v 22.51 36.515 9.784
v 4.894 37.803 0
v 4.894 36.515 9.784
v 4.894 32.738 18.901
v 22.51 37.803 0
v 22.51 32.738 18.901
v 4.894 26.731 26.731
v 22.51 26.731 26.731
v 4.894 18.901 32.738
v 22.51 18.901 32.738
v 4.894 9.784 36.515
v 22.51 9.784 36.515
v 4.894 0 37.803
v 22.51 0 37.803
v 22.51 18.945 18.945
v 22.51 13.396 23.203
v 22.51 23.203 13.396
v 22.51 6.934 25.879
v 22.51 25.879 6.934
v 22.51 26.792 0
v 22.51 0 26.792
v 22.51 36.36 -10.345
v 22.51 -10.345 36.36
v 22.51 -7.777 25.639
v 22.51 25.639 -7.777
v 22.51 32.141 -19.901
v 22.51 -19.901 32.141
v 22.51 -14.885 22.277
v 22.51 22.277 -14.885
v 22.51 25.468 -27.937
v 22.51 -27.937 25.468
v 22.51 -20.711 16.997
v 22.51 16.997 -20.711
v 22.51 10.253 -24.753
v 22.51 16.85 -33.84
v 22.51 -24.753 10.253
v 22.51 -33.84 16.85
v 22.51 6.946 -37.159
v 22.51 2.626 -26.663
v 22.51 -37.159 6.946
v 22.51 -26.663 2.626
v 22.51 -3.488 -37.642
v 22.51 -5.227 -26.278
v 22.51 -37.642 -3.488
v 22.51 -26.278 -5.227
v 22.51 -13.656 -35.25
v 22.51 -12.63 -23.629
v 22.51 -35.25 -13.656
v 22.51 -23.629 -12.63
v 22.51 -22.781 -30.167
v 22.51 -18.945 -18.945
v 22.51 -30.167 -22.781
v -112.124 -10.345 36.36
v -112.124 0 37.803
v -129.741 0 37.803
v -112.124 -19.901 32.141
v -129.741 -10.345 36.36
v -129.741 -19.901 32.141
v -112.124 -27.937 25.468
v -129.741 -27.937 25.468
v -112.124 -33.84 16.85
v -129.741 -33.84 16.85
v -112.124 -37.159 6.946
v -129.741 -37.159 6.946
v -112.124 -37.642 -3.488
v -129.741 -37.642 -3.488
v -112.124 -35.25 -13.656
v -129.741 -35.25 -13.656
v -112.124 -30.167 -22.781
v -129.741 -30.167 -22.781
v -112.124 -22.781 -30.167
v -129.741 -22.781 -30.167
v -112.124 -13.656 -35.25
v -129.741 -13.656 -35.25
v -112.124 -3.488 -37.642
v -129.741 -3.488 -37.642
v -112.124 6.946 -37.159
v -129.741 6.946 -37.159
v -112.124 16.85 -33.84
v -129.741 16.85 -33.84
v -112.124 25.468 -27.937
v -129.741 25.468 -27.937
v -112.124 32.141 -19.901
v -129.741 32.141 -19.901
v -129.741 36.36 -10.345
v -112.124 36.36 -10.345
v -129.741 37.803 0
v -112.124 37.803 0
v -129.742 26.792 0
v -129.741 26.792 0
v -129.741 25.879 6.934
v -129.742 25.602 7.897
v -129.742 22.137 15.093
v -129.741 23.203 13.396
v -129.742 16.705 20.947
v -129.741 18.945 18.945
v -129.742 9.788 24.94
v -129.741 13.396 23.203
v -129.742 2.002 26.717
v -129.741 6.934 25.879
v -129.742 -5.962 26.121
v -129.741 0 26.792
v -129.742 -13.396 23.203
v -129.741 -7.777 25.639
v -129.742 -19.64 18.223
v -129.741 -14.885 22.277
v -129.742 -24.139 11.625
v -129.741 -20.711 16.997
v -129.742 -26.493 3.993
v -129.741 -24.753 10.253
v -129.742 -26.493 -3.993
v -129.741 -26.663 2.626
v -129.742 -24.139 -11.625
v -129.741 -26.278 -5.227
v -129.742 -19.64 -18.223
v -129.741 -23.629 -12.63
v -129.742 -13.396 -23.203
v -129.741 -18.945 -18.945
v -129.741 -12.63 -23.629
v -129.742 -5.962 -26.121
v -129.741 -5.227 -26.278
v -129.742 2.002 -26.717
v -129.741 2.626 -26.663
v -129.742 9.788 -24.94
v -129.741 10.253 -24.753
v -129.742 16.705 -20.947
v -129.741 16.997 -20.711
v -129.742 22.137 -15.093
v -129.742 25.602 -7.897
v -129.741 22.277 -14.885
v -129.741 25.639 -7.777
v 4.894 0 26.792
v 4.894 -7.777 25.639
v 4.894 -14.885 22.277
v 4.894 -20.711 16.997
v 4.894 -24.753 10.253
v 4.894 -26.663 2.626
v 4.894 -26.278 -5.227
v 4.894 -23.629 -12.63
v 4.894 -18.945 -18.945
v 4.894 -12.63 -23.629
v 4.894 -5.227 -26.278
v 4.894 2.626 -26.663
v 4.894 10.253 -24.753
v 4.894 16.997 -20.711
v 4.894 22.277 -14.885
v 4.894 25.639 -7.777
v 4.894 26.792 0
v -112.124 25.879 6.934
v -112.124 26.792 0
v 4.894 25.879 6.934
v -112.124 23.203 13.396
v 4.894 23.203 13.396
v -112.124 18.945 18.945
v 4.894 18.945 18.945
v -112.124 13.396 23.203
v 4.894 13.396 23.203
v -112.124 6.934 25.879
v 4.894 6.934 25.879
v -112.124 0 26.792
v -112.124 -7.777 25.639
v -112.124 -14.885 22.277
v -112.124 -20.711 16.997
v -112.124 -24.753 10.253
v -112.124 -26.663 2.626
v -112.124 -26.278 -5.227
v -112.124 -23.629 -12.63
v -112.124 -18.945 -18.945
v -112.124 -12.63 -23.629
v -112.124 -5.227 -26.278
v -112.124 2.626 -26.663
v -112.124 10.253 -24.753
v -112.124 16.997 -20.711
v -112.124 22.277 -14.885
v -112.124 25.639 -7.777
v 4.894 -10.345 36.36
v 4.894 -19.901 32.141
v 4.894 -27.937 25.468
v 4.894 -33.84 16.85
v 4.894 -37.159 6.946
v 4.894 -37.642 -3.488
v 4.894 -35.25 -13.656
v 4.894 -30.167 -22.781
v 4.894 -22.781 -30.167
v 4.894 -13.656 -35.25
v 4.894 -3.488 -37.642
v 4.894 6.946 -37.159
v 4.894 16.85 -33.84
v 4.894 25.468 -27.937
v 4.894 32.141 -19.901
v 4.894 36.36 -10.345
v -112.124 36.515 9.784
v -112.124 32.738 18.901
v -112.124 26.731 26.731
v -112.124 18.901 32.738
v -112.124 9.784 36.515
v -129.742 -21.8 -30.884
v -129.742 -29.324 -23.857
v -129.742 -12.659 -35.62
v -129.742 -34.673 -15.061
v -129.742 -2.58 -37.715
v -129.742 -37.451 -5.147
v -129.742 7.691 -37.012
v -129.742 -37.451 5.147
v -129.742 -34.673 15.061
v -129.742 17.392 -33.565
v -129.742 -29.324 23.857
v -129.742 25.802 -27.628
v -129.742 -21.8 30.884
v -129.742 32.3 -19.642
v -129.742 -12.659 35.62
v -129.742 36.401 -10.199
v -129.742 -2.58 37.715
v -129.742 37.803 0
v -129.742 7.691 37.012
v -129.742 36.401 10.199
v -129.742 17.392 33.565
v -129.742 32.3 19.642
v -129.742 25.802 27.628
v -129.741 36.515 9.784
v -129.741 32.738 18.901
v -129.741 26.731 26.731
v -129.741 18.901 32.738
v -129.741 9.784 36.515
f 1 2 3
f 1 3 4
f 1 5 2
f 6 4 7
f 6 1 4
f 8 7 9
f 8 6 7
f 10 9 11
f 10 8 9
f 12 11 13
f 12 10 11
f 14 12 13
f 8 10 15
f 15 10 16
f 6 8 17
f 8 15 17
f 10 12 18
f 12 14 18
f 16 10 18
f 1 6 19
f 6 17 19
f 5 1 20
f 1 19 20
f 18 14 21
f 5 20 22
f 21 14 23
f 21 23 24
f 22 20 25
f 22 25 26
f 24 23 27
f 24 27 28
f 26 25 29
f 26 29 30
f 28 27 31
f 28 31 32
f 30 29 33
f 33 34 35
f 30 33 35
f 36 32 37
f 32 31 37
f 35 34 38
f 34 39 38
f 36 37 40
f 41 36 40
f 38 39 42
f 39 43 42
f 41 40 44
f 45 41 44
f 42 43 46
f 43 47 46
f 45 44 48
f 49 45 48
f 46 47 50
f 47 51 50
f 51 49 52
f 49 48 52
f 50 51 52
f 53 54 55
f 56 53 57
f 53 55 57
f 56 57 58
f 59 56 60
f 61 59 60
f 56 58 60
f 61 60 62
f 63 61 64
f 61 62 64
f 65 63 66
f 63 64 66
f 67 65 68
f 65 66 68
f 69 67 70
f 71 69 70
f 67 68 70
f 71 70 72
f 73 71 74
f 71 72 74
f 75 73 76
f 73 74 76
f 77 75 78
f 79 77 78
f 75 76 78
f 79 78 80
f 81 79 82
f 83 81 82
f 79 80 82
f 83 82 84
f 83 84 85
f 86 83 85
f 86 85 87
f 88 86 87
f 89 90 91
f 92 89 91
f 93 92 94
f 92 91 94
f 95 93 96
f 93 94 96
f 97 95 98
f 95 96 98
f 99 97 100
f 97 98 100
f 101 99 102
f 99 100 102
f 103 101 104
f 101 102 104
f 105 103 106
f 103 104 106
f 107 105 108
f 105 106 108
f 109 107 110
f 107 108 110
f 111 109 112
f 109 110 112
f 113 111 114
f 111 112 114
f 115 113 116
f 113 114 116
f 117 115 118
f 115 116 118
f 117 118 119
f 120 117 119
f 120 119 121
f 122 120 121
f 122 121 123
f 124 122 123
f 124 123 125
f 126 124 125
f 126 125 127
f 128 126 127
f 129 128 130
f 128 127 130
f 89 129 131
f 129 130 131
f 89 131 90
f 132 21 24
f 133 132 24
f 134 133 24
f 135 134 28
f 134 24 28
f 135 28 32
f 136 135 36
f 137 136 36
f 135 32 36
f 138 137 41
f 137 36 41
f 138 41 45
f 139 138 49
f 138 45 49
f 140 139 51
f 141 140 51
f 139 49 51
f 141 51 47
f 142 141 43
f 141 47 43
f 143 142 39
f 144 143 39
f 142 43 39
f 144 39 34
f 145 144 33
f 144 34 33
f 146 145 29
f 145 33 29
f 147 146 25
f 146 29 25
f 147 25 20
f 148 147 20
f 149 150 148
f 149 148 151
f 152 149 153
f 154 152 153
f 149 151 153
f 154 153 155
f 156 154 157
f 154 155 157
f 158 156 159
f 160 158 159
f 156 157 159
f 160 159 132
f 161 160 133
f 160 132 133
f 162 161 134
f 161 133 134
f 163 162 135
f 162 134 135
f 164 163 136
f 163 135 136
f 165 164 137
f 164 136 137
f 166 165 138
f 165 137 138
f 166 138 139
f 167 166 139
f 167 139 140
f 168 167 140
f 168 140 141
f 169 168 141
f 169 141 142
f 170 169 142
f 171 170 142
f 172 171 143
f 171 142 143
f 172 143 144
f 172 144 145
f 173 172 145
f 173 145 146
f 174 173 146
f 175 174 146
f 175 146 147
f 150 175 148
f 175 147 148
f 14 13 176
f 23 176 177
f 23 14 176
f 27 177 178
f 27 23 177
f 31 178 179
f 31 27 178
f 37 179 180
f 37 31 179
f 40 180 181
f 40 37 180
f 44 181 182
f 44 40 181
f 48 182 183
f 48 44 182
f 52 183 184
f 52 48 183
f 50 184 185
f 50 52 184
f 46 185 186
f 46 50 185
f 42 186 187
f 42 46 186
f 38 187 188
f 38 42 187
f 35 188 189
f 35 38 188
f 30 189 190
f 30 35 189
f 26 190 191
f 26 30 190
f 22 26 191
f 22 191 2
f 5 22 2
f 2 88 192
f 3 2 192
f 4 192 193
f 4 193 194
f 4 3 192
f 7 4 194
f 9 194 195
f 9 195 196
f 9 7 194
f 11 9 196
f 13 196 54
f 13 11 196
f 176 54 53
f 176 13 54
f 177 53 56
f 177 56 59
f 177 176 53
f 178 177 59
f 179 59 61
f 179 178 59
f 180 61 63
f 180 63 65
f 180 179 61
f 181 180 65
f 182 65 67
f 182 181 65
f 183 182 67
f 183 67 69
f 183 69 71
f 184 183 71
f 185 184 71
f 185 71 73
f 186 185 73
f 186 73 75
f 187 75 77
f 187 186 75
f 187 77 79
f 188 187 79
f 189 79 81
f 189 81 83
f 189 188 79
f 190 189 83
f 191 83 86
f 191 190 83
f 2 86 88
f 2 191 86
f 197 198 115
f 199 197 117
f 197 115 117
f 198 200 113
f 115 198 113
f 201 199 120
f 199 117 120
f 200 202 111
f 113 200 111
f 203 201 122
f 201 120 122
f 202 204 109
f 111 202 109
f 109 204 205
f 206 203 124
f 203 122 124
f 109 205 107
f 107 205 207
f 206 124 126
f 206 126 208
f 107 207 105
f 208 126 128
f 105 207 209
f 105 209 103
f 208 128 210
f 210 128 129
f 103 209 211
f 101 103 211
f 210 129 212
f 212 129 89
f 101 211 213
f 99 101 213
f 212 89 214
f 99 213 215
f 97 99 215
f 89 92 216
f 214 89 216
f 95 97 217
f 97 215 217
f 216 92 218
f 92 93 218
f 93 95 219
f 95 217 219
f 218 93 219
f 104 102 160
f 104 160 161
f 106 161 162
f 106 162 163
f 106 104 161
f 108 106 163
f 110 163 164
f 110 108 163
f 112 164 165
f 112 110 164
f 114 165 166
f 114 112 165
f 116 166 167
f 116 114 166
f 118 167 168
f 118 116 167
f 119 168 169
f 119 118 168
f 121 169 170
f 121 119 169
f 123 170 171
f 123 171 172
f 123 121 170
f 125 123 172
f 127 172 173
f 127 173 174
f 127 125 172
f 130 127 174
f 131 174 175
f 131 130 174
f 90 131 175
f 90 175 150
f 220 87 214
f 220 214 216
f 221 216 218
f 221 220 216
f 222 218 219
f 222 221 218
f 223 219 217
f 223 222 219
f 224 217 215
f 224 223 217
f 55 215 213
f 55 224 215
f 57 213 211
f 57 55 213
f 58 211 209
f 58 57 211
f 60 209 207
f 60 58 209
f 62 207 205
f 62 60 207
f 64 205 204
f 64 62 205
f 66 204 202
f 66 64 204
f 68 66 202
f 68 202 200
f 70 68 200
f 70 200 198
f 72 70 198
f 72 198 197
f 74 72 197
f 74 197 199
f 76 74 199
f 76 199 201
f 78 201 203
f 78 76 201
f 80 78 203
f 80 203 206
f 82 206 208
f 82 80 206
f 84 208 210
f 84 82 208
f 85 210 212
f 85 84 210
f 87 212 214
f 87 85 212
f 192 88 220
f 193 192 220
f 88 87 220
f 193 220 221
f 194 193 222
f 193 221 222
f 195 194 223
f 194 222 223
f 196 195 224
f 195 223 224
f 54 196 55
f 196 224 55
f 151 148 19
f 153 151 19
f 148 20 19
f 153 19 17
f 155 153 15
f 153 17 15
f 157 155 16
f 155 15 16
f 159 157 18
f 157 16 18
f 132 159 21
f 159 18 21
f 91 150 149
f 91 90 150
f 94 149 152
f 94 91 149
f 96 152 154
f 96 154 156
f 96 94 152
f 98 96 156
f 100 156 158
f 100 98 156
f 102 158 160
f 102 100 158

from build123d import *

# Parameters (mm, degrees)
F1_W     = 17.6168819889
F1_H     = 11.0105499625
F5_R     = 37.8028899431
F5_R_2   = 26.7923399806
F6_DEPTH = 152.2524452932


# Not quite as in the source:
# - a pattern or mirror of a feature is missing from the dataset's text; its kind, count and spacing are read off the source's solid
# - the program builds the solid bodies; features that only make, move or delete a surface that nothing else refers to are left out


with BuildPart() as f2:
    # F1 (on Front) → F2 (revolve)
    with BuildSketch(Plane.XZ):
        with Locations((13.7020186521, 32.2976149619)):
            Rectangle(F1_W, F1_H)
    revolve(axis=Axis((44.2868806422, 0, 0), (1, 0, 0)))


with BuildPart() as f2_copies_1:
    # F2_copies: instance of F2
    add(f2.part.mirror(Plane(origin=(-53.615263, 0, 0), x_dir=(0, 0, -1), z_dir=(-1, 0, 0))))


with BuildPart() as f2_1:
    add(f2.part)

    add(f2_copies_1.part)  # F6 merges F2_copies_1
    # F5 (on face) → F6 (join, through all)
    with BuildSketch(Plane.YZ.offset(22.5104596466)):
        Circle(F5_R)
        Circle(F5_R_2, mode=Mode.SUBTRACT)
    extrude(amount=-F6_DEPTH)


solid = f2_1.part
